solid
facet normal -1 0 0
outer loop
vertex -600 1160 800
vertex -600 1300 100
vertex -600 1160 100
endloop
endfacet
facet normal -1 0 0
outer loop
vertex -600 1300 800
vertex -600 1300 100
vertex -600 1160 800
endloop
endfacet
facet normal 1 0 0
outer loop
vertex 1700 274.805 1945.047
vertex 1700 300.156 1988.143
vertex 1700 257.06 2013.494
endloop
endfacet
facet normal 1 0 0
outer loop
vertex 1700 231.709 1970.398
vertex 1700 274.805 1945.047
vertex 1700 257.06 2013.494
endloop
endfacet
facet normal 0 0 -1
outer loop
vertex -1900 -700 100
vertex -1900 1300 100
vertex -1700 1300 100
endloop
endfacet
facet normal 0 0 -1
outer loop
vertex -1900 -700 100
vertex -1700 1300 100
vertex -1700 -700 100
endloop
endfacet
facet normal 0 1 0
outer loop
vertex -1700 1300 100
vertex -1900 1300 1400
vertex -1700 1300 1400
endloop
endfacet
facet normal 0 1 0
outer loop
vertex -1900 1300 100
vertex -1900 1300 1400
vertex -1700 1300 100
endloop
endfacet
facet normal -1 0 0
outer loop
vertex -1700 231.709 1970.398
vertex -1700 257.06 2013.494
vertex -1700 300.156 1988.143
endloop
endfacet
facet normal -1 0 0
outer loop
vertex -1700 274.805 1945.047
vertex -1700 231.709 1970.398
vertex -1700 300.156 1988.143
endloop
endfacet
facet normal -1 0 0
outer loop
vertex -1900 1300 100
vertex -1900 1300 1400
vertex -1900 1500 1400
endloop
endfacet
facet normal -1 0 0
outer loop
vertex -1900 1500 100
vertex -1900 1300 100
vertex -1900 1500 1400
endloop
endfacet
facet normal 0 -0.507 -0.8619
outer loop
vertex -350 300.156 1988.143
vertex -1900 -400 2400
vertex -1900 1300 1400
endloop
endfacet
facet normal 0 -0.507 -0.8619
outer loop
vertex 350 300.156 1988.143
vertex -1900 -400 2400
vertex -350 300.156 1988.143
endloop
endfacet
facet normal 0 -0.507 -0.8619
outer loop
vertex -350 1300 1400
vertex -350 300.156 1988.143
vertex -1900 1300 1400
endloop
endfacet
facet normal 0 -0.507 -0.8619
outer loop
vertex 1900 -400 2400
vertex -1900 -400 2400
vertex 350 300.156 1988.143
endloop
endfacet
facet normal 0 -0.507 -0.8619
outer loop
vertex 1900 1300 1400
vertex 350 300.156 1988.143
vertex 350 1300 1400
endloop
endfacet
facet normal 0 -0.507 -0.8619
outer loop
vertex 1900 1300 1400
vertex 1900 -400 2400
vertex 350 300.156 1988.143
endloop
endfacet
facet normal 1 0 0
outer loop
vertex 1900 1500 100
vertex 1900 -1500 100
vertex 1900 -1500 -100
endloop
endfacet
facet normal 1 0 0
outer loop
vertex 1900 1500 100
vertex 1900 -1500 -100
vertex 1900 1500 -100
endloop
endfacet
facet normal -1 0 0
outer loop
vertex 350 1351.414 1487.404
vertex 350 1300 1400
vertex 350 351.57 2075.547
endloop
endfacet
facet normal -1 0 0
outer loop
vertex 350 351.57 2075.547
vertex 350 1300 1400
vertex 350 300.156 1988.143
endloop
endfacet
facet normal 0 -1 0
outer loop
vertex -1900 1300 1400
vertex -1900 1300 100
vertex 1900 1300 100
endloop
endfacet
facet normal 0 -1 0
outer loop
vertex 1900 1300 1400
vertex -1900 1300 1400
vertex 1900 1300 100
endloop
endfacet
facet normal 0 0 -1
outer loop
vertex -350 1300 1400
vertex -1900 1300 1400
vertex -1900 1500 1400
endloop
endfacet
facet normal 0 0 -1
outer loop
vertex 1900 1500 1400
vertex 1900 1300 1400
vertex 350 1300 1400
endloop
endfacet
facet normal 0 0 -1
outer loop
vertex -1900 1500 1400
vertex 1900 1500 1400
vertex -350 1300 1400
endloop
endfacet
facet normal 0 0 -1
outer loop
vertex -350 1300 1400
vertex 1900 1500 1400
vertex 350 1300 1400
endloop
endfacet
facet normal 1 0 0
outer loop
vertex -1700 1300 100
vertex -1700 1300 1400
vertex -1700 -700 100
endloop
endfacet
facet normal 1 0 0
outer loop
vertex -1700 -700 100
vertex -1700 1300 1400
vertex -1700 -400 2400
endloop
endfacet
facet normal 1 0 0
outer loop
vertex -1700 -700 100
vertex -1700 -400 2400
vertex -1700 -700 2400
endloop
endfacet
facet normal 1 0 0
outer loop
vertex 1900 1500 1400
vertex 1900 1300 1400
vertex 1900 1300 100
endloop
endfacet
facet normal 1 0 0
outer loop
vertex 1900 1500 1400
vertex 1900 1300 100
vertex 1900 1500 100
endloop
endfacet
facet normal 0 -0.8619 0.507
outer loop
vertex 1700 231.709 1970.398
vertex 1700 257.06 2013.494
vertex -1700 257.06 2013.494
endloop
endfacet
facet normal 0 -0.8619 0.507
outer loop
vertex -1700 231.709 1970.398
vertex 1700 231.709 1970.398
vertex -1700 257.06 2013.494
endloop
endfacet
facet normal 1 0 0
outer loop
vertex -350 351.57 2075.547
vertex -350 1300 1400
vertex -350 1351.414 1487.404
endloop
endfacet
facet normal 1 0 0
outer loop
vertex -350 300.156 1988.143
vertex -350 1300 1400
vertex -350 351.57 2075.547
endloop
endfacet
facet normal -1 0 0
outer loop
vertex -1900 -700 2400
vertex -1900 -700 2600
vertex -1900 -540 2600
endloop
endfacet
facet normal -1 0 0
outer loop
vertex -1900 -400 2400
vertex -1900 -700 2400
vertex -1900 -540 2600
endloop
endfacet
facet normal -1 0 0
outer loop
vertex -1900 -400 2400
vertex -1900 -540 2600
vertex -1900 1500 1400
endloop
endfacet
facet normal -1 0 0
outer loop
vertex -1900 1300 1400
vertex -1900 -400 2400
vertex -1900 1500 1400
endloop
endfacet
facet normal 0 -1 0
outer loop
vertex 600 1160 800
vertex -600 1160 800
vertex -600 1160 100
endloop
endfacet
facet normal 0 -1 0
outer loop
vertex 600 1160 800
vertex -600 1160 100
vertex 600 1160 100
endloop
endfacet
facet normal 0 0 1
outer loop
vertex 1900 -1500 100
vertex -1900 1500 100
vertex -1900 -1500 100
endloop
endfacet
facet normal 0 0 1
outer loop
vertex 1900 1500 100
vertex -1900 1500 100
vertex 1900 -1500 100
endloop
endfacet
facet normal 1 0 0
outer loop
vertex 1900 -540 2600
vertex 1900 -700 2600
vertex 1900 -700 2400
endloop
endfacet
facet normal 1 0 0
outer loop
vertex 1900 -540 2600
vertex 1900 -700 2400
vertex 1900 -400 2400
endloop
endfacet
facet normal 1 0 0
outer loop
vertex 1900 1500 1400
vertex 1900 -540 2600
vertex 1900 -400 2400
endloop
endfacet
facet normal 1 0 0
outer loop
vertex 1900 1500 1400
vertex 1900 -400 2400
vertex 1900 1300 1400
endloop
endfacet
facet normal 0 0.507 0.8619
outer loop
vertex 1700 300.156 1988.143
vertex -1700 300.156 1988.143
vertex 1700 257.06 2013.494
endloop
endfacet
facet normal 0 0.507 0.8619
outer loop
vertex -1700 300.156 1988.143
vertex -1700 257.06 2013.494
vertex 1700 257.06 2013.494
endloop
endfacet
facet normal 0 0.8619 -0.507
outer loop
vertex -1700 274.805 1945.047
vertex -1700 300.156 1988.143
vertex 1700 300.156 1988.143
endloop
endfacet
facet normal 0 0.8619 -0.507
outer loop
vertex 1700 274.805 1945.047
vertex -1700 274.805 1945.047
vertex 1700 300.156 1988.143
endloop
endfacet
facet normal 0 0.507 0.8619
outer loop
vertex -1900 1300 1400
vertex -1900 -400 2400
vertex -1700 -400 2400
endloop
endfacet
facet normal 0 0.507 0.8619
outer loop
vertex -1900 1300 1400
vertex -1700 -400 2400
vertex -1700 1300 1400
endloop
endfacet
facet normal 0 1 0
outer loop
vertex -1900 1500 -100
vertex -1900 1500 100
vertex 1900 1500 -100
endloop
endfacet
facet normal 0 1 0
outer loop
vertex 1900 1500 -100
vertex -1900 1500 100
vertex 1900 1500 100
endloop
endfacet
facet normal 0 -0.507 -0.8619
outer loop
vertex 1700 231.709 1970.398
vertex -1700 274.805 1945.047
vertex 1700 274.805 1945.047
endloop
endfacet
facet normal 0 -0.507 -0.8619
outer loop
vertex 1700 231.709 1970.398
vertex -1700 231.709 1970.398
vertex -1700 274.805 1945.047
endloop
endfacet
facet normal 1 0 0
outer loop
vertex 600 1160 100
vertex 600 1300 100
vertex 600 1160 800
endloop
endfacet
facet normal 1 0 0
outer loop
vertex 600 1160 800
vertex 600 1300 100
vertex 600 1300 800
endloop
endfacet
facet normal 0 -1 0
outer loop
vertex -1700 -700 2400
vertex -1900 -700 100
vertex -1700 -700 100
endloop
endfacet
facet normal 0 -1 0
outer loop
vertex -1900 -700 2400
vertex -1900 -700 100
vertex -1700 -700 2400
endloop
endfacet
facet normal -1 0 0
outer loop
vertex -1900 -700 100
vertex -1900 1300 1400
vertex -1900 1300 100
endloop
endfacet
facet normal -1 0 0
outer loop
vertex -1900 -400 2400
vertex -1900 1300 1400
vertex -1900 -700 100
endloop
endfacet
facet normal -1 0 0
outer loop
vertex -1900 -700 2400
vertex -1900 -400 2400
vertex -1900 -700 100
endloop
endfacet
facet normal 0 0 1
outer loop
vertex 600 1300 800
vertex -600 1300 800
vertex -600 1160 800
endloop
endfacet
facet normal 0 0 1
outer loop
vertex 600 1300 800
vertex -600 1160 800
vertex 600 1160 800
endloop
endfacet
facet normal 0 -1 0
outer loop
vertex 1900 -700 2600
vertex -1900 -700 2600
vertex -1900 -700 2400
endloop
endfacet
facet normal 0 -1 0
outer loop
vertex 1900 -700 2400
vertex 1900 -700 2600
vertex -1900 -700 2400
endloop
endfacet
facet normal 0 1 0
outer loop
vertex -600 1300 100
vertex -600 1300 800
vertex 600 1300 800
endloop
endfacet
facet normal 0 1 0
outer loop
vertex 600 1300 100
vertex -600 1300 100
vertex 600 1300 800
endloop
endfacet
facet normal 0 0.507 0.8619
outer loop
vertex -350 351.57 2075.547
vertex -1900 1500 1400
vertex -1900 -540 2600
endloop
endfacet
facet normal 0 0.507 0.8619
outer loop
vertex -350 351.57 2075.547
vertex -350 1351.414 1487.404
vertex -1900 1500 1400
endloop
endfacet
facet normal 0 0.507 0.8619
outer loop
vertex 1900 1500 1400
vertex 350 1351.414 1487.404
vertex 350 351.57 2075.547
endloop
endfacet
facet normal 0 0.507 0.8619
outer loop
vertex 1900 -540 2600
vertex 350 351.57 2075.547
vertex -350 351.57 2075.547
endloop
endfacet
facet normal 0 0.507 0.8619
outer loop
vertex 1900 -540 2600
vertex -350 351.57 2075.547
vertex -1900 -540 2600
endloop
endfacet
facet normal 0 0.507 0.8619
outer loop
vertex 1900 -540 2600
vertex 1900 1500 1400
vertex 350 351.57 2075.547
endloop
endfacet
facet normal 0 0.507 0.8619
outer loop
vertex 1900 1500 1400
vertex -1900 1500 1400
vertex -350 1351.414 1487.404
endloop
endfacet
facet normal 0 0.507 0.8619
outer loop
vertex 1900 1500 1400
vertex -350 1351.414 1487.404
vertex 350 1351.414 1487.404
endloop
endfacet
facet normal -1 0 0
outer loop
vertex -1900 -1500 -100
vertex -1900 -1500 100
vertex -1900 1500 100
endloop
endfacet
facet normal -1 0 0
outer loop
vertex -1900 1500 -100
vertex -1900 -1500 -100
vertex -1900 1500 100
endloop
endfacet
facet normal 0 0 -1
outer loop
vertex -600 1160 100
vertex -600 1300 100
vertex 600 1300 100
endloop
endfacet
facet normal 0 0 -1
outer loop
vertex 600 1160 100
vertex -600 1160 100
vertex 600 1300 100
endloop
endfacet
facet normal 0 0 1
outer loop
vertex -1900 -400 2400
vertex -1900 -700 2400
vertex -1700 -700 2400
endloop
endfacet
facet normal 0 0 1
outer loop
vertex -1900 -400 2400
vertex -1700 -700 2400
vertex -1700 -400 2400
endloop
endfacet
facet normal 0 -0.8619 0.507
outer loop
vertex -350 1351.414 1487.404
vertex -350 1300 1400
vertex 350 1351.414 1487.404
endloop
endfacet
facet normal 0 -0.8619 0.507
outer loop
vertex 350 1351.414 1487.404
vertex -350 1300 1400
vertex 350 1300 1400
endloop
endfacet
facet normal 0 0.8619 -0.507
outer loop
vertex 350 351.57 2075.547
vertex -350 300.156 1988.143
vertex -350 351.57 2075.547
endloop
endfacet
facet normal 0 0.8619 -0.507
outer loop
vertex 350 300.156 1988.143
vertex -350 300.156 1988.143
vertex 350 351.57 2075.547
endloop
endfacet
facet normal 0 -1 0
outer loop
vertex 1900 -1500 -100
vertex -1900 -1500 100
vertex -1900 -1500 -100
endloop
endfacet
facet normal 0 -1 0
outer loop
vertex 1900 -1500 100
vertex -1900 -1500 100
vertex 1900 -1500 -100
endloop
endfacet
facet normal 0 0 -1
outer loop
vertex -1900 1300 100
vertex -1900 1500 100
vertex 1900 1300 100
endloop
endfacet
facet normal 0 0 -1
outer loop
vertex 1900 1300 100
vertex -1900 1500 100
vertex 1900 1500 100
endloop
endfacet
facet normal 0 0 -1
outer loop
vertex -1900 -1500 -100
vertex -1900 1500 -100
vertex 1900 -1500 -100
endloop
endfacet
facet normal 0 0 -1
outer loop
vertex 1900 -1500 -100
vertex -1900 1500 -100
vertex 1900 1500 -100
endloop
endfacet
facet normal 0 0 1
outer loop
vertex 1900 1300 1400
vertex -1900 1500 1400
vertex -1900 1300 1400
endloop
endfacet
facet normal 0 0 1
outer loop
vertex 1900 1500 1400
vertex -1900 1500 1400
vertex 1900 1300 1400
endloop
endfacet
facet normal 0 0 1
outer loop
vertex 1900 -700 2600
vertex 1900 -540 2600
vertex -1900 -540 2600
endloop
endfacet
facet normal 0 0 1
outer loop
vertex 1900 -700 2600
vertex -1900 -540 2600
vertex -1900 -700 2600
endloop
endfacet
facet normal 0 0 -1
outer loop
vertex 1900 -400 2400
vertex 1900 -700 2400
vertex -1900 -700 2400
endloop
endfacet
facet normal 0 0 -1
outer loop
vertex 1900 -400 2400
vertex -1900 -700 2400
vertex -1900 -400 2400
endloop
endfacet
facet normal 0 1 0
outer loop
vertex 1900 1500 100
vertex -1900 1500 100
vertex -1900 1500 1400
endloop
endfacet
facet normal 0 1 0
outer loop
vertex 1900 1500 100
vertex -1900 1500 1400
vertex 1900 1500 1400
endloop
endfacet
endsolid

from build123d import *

# Parameters (mm, degrees)
F0_W      = 3800
F0_H      = 3000
F1_DEPTH  = 100
F2_W      = 3800
F2_H      = 200
F3_DEPTH  = 1300
F5_DEPTH  = 200
F7_DEPTH  = 3800
F8_W      = 700
F8_H      = 1160
F9_DEPTH  = 101.4040253127
F10_W     = 1200
F10_H     = 700
F11_DEPTH = 140
F12_DEPTH = 50


with BuildPart() as f1:
    # F0 (on Top) → F1 (new body, symmetric)
    with BuildSketch(Plane.XY):
        Rectangle(F0_W, F0_H)
    extrude(amount=F1_DEPTH, both=True)


with BuildPart() as f3:
    # F2 (on face) → F3 (new body)
    with BuildSketch(Plane.XY.offset(100)):
        with Locations((0, 1400)):
            Rectangle(F2_W, F2_H)
    extrude(amount=F3_DEPTH)


with BuildPart() as f5:
    # F4 (on face) → F5 (new body)
    with BuildSketch(Plane(origin=(-1900, 0, 0), x_dir=(0, -1, 0), z_dir=(-1, 0, 0))):
        Polygon((400, 2400), (-1300, 1400), (-1300, 100), (700, 100), (700, 2400), align=None)
    extrude(amount=-F5_DEPTH)


with BuildPart() as f7:
    # F6 (on face) → F7 (new body, through all)
    with BuildSketch(Plane.YZ.offset(1900)):
        Polygon((-700, 2600), (-700, 2400), (-400, 2400), (1300, 1400), (1500, 1400), (-540, 2600), align=None)
    extrude(amount=-F7_DEPTH)

    # F8 (on face) → F9 (cut, through all)
    with BuildSketch(Plane(origin=(0, 946.0154241645, 1608.2262210797), x_dir=(1, 0, 0), z_dir=(0, -0.5070201266, -0.8619342152))):
        with Locations((0, 169.3136974837)):
            Rectangle(F8_W, F8_H)
    extrude(amount=-F9_DEPTH, mode=Mode.SUBTRACT)


with BuildPart() as f11:
    # F10 (on face) → F11 (new body)
    with BuildSketch(Plane.XZ.offset(-1300)):
        with Locations((0, 450)):
            Rectangle(F10_W, F10_H)
    extrude(amount=F11_DEPTH)


with BuildPart() as f12:
    # F8 (on face) → F12 (new body)
    with BuildSketch(Plane(origin=(0, 946.0154241645, 1608.2262210797), x_dir=(1, 0, 0), z_dir=(0, -0.5070201266, -0.8619342152))):
        Polygon((-1700, 749.3136974837), (-350, 749.3136974837), (350, 749.3136974837), (1700, 749.3136974837), (1700, 799.3136974837), (-1700, 799.3136974837), align=None)
    extrude(amount=F12_DEPTH)


solid = Compound([f1.part, f3.part, f5.part, f7.part, f11.part, f12.part])
